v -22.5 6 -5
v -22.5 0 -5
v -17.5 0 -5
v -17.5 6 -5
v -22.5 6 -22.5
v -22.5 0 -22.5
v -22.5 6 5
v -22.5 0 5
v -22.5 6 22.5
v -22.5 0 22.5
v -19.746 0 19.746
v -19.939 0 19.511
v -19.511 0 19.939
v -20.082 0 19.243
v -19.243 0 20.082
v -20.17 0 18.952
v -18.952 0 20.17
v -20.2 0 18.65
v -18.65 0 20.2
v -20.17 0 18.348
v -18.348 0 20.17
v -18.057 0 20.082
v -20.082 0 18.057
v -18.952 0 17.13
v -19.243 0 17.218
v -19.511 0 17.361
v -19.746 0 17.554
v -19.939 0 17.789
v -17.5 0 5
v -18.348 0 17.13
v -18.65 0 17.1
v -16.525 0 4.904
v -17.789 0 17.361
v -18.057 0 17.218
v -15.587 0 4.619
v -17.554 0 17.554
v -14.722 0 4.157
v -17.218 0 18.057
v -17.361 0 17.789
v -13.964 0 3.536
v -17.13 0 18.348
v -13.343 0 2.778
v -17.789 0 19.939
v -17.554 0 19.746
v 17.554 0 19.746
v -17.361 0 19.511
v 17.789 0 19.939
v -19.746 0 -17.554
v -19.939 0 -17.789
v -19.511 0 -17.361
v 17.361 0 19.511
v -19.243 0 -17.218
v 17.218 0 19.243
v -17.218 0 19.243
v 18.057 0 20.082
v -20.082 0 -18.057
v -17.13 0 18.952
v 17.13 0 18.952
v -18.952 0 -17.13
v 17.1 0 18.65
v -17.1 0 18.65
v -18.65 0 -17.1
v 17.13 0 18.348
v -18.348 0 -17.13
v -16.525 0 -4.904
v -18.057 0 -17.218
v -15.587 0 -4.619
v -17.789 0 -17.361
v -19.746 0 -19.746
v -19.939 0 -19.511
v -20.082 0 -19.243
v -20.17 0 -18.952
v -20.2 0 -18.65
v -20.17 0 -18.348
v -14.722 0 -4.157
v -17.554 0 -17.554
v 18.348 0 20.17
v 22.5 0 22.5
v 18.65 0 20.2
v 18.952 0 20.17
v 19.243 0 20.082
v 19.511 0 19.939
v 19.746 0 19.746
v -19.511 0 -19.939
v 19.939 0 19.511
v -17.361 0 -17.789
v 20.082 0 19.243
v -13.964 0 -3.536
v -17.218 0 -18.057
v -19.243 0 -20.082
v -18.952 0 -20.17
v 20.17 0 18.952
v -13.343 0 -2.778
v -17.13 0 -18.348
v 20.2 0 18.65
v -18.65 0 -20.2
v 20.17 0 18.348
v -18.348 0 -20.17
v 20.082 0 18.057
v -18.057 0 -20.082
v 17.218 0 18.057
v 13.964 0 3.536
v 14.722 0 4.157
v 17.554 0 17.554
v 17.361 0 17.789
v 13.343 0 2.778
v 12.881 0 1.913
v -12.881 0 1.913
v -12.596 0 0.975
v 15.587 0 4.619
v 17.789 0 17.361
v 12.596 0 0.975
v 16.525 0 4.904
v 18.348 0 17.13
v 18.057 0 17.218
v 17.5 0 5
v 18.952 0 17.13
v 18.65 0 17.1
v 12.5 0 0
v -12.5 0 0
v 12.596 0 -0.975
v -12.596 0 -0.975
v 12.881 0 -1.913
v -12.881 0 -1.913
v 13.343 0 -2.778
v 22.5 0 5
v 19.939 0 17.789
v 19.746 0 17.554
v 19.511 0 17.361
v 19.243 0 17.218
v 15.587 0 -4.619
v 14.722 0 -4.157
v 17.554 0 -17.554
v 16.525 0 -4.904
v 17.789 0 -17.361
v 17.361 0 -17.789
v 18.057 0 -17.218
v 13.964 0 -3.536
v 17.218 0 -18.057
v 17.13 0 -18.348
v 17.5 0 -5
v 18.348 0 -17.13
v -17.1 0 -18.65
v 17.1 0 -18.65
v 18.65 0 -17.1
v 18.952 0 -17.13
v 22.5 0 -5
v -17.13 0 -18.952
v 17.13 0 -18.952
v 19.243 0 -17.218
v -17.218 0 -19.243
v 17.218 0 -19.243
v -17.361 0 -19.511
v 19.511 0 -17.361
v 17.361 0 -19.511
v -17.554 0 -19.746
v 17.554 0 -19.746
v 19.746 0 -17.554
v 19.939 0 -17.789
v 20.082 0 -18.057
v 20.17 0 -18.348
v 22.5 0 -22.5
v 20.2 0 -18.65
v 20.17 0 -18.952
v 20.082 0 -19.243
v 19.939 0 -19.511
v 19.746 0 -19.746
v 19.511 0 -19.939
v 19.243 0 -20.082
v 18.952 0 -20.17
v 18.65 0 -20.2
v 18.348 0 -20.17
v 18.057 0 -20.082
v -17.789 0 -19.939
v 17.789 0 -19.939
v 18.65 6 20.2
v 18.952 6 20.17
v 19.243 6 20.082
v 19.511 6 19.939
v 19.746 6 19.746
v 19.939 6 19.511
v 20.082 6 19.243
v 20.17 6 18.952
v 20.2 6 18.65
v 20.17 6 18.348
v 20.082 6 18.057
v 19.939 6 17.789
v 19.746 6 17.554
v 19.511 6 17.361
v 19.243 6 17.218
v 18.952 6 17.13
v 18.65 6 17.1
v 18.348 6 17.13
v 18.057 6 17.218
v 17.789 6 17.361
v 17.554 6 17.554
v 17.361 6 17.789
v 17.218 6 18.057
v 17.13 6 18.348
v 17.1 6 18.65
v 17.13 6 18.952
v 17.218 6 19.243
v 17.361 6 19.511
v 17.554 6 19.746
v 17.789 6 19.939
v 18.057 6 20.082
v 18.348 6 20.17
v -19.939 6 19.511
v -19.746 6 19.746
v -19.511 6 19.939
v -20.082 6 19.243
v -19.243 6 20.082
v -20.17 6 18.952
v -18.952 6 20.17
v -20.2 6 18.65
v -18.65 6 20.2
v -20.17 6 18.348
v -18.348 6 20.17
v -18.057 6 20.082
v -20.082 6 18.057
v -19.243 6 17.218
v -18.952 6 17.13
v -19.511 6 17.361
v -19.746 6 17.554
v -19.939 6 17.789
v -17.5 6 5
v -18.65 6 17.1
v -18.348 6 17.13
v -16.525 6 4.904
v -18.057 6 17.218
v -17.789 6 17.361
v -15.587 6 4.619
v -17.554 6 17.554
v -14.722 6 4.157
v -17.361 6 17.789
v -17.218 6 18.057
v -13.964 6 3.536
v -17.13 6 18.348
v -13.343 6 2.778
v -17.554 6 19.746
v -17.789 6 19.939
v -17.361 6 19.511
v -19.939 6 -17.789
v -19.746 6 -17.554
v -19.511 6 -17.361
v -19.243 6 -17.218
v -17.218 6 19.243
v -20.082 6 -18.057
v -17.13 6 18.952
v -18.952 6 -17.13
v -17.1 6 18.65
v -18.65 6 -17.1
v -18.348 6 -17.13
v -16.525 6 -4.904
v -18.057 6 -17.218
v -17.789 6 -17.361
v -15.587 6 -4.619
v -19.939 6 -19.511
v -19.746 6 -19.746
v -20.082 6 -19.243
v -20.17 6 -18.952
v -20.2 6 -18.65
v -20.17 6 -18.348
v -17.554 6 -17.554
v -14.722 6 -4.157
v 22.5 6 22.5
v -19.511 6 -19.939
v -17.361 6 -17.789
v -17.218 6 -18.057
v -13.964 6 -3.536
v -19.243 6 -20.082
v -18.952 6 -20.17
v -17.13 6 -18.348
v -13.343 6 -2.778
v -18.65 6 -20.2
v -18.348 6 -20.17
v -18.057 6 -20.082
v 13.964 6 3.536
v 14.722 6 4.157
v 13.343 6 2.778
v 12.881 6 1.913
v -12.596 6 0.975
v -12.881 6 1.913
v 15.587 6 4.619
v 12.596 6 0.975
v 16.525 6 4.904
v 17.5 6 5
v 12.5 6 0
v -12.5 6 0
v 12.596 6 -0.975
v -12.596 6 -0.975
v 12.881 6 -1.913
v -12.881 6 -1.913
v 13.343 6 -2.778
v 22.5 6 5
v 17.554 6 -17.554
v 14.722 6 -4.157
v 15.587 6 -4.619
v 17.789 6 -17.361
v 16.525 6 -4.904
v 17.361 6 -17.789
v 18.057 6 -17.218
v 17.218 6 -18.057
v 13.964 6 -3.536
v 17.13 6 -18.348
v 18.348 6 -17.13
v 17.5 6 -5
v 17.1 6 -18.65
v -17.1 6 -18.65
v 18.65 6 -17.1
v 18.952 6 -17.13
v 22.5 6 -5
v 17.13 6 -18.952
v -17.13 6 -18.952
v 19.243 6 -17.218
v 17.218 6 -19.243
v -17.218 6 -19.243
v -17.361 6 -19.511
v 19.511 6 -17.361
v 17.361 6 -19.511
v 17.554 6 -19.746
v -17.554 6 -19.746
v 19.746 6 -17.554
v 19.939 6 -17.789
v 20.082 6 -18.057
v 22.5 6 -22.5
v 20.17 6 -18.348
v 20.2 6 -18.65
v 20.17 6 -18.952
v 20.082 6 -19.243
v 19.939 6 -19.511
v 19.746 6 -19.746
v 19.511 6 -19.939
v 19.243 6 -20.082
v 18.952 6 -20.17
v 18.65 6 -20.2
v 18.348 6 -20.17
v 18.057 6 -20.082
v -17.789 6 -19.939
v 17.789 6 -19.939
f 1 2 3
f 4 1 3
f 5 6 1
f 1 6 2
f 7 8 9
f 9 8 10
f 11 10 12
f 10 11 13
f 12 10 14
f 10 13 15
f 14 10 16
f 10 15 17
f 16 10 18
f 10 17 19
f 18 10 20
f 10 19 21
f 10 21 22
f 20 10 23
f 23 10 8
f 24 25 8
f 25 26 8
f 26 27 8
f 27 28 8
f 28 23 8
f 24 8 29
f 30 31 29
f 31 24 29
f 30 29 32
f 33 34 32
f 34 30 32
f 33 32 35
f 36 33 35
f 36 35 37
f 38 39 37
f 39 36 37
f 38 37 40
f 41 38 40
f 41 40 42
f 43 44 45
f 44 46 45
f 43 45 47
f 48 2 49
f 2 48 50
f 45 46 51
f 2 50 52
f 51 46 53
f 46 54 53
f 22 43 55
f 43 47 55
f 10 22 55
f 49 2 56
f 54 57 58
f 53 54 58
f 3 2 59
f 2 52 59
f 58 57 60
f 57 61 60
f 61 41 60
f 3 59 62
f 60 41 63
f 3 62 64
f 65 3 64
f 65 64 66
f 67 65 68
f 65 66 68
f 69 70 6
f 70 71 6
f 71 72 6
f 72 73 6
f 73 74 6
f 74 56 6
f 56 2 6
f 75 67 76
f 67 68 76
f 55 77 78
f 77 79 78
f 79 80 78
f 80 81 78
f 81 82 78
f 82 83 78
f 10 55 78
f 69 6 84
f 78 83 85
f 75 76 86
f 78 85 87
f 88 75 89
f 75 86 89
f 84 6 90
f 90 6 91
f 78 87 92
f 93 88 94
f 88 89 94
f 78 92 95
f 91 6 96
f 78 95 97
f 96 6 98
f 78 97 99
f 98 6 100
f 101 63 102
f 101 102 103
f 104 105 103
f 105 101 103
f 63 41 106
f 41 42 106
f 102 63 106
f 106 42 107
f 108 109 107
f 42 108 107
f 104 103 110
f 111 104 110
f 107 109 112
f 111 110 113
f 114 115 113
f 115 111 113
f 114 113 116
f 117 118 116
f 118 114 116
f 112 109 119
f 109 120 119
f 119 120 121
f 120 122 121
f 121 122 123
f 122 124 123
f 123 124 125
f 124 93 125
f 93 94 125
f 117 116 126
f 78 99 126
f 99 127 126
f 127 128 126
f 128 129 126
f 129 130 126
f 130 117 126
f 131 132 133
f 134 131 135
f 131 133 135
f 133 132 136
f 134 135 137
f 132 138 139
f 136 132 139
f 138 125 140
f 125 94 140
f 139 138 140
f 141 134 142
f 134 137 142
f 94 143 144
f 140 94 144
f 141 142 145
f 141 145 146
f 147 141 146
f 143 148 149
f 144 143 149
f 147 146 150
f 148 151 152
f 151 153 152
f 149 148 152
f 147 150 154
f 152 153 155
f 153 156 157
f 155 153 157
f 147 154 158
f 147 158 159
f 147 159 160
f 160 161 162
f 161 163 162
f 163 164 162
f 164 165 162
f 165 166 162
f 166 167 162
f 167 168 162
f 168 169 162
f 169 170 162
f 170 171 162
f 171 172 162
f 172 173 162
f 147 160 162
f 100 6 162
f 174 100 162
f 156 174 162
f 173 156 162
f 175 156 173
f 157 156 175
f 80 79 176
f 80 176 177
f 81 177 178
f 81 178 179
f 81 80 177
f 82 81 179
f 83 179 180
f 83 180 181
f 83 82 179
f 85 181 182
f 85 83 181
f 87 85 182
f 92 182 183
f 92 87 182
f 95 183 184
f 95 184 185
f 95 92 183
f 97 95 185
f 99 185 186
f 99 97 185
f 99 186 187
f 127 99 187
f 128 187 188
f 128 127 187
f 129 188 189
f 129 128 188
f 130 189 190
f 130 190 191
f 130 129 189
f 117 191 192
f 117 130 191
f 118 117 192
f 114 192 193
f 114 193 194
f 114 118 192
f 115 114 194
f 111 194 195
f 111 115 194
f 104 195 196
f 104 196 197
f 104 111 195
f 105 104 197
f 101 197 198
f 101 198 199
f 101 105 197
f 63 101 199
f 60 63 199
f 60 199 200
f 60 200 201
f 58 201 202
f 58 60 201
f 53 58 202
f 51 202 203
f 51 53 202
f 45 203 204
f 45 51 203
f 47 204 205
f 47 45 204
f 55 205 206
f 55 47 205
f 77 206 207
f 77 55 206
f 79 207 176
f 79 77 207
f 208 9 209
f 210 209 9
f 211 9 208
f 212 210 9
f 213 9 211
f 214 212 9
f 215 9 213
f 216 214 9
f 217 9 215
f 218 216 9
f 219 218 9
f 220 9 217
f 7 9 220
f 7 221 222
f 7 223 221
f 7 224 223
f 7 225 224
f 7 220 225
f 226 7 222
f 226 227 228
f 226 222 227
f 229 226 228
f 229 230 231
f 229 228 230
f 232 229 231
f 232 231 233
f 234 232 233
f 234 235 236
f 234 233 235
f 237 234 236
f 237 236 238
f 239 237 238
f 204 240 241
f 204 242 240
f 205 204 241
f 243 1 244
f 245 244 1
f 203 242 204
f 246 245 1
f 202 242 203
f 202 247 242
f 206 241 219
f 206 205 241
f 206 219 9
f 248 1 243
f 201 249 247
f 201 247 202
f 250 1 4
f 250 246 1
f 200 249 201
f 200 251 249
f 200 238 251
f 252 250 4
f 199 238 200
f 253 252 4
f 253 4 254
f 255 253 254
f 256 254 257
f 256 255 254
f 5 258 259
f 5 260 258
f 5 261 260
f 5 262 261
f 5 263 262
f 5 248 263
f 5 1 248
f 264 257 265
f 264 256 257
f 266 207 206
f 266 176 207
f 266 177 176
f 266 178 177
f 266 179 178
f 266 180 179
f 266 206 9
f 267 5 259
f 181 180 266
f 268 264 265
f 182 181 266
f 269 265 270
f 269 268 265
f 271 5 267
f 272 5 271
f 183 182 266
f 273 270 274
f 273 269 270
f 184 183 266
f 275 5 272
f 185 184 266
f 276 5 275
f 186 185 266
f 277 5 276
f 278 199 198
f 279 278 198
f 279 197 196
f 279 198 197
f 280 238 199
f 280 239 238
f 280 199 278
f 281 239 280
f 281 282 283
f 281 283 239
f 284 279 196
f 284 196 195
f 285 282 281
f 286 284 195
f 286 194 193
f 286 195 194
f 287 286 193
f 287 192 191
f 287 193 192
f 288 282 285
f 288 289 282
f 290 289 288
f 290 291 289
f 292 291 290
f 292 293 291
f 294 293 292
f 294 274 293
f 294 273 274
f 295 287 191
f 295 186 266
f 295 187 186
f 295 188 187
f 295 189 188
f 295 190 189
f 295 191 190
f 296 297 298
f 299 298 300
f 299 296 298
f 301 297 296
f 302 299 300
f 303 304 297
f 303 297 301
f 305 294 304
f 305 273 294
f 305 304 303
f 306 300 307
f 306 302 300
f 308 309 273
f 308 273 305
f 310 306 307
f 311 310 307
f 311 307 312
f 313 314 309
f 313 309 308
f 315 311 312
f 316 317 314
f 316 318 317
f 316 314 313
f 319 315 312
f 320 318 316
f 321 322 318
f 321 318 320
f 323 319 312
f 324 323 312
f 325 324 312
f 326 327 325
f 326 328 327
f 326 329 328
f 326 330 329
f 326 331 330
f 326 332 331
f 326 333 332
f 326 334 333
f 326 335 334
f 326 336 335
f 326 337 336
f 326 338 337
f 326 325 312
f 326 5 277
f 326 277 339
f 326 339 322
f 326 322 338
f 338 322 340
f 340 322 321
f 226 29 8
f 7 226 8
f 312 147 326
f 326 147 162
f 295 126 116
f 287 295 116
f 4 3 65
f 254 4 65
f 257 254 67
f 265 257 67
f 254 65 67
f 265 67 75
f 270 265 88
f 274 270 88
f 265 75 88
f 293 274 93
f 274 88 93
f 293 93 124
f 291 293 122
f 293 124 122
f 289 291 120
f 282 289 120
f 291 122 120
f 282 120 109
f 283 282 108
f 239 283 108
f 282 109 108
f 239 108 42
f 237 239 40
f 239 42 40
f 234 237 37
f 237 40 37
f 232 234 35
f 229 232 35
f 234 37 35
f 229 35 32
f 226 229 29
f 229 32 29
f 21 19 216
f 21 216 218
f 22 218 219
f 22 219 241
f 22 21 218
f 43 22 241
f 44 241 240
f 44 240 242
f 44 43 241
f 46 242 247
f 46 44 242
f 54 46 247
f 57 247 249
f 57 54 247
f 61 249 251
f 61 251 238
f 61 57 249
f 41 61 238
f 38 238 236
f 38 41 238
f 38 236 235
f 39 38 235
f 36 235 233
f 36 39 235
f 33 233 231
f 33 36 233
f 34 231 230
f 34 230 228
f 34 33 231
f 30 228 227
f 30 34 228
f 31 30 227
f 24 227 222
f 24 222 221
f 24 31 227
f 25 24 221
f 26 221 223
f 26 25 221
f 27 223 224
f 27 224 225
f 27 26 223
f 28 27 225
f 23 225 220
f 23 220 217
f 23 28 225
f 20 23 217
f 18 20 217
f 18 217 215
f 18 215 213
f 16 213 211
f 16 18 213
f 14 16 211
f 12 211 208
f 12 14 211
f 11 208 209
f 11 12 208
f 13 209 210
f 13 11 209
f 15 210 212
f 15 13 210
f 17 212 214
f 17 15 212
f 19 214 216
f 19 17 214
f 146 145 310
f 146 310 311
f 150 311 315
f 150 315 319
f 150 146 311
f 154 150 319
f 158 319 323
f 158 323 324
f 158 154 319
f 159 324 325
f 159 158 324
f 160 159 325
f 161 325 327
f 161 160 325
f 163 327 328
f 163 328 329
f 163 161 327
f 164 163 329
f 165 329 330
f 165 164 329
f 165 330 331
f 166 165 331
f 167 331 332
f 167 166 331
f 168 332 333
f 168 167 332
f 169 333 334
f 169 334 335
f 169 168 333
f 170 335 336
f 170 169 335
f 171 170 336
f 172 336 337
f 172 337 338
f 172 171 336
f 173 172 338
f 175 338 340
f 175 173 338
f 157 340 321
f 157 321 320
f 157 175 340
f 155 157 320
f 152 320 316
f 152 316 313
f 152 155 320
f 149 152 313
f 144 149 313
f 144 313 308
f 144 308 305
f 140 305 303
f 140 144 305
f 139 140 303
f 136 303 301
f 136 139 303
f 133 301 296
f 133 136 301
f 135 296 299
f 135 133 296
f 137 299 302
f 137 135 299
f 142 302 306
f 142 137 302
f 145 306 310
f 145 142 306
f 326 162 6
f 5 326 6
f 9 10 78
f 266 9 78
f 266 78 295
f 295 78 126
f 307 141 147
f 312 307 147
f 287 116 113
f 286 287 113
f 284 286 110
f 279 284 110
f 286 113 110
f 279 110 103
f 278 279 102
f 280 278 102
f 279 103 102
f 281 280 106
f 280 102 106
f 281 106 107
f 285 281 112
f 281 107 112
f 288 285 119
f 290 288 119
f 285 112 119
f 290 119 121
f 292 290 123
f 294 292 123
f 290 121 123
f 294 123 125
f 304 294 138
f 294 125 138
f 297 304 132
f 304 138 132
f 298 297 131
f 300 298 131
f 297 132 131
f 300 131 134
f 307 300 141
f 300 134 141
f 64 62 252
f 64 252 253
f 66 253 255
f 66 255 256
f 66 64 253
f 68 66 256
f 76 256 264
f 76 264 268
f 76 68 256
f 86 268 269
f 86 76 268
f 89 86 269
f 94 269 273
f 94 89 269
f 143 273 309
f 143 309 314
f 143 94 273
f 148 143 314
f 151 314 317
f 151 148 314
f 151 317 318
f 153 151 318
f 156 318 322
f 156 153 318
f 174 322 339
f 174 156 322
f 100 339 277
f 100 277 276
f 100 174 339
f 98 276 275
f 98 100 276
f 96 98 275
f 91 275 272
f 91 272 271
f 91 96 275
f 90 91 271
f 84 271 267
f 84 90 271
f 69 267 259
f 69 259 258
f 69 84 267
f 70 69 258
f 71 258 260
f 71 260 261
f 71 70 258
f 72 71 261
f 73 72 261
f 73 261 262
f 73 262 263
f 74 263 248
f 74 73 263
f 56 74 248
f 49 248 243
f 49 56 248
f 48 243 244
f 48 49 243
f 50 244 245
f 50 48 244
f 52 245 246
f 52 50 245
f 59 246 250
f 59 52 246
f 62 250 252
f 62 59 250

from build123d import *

# Parameters (mm, degrees)
SKETCH1_R           = 1.55
BOSS_EXTRUDE1_DEPTH = 6


with BuildPart() as part:
    # Sketch1 → Boss-Extrude1 (new body)
    with BuildSketch(Plane(origin=(0, 0, 0), x_dir=(1, 0, 0), z_dir=(0, 1, 0))):
        with BuildLine():
            Line((-22.5, -5), (-22.5, -22.5))
            Line((-22.5, -22.5), (22.5, -22.5))
            Line((22.5, -22.5), (22.5, -5))
            Line((22.5, -5), (17.5, -5))
            ThreePointArc((17.5, -5), (12.5, 0), (17.5, 5))
            Line((17.5, 5), (22.5, 5))
            Line((22.5, 5), (22.5, 22.5))
            Line((22.5, 22.5), (-22.5, 22.5))
            Line((-22.5, 22.5), (-22.5, 5))
            Line((-22.5, 5), (-17.5, 5))
            ThreePointArc((-17.5, 5), (-12.5, 0), (-17.5, -5))
            Line((-17.5, -5), (-22.5, -5))
        make_face()
        with Locations(Location((-18.65, -18.65, 0), (0, 0, 270))):
            Circle(SKETCH1_R, mode=Mode.SUBTRACT)
        with Locations(Location((18.65, -18.65, 0), (0, 0, 270))):
            Circle(SKETCH1_R, mode=Mode.SUBTRACT)
        with Locations(Location((-18.65, 18.65, 0), (0, 0, 270))):
            Circle(SKETCH1_R, mode=Mode.SUBTRACT)
        with Locations(Location((18.65, 18.65, 0), (0, 0, 270))):
            Circle(SKETCH1_R, mode=Mode.SUBTRACT)
    extrude(amount=BOSS_EXTRUDE1_DEPTH)


solid = part.part
